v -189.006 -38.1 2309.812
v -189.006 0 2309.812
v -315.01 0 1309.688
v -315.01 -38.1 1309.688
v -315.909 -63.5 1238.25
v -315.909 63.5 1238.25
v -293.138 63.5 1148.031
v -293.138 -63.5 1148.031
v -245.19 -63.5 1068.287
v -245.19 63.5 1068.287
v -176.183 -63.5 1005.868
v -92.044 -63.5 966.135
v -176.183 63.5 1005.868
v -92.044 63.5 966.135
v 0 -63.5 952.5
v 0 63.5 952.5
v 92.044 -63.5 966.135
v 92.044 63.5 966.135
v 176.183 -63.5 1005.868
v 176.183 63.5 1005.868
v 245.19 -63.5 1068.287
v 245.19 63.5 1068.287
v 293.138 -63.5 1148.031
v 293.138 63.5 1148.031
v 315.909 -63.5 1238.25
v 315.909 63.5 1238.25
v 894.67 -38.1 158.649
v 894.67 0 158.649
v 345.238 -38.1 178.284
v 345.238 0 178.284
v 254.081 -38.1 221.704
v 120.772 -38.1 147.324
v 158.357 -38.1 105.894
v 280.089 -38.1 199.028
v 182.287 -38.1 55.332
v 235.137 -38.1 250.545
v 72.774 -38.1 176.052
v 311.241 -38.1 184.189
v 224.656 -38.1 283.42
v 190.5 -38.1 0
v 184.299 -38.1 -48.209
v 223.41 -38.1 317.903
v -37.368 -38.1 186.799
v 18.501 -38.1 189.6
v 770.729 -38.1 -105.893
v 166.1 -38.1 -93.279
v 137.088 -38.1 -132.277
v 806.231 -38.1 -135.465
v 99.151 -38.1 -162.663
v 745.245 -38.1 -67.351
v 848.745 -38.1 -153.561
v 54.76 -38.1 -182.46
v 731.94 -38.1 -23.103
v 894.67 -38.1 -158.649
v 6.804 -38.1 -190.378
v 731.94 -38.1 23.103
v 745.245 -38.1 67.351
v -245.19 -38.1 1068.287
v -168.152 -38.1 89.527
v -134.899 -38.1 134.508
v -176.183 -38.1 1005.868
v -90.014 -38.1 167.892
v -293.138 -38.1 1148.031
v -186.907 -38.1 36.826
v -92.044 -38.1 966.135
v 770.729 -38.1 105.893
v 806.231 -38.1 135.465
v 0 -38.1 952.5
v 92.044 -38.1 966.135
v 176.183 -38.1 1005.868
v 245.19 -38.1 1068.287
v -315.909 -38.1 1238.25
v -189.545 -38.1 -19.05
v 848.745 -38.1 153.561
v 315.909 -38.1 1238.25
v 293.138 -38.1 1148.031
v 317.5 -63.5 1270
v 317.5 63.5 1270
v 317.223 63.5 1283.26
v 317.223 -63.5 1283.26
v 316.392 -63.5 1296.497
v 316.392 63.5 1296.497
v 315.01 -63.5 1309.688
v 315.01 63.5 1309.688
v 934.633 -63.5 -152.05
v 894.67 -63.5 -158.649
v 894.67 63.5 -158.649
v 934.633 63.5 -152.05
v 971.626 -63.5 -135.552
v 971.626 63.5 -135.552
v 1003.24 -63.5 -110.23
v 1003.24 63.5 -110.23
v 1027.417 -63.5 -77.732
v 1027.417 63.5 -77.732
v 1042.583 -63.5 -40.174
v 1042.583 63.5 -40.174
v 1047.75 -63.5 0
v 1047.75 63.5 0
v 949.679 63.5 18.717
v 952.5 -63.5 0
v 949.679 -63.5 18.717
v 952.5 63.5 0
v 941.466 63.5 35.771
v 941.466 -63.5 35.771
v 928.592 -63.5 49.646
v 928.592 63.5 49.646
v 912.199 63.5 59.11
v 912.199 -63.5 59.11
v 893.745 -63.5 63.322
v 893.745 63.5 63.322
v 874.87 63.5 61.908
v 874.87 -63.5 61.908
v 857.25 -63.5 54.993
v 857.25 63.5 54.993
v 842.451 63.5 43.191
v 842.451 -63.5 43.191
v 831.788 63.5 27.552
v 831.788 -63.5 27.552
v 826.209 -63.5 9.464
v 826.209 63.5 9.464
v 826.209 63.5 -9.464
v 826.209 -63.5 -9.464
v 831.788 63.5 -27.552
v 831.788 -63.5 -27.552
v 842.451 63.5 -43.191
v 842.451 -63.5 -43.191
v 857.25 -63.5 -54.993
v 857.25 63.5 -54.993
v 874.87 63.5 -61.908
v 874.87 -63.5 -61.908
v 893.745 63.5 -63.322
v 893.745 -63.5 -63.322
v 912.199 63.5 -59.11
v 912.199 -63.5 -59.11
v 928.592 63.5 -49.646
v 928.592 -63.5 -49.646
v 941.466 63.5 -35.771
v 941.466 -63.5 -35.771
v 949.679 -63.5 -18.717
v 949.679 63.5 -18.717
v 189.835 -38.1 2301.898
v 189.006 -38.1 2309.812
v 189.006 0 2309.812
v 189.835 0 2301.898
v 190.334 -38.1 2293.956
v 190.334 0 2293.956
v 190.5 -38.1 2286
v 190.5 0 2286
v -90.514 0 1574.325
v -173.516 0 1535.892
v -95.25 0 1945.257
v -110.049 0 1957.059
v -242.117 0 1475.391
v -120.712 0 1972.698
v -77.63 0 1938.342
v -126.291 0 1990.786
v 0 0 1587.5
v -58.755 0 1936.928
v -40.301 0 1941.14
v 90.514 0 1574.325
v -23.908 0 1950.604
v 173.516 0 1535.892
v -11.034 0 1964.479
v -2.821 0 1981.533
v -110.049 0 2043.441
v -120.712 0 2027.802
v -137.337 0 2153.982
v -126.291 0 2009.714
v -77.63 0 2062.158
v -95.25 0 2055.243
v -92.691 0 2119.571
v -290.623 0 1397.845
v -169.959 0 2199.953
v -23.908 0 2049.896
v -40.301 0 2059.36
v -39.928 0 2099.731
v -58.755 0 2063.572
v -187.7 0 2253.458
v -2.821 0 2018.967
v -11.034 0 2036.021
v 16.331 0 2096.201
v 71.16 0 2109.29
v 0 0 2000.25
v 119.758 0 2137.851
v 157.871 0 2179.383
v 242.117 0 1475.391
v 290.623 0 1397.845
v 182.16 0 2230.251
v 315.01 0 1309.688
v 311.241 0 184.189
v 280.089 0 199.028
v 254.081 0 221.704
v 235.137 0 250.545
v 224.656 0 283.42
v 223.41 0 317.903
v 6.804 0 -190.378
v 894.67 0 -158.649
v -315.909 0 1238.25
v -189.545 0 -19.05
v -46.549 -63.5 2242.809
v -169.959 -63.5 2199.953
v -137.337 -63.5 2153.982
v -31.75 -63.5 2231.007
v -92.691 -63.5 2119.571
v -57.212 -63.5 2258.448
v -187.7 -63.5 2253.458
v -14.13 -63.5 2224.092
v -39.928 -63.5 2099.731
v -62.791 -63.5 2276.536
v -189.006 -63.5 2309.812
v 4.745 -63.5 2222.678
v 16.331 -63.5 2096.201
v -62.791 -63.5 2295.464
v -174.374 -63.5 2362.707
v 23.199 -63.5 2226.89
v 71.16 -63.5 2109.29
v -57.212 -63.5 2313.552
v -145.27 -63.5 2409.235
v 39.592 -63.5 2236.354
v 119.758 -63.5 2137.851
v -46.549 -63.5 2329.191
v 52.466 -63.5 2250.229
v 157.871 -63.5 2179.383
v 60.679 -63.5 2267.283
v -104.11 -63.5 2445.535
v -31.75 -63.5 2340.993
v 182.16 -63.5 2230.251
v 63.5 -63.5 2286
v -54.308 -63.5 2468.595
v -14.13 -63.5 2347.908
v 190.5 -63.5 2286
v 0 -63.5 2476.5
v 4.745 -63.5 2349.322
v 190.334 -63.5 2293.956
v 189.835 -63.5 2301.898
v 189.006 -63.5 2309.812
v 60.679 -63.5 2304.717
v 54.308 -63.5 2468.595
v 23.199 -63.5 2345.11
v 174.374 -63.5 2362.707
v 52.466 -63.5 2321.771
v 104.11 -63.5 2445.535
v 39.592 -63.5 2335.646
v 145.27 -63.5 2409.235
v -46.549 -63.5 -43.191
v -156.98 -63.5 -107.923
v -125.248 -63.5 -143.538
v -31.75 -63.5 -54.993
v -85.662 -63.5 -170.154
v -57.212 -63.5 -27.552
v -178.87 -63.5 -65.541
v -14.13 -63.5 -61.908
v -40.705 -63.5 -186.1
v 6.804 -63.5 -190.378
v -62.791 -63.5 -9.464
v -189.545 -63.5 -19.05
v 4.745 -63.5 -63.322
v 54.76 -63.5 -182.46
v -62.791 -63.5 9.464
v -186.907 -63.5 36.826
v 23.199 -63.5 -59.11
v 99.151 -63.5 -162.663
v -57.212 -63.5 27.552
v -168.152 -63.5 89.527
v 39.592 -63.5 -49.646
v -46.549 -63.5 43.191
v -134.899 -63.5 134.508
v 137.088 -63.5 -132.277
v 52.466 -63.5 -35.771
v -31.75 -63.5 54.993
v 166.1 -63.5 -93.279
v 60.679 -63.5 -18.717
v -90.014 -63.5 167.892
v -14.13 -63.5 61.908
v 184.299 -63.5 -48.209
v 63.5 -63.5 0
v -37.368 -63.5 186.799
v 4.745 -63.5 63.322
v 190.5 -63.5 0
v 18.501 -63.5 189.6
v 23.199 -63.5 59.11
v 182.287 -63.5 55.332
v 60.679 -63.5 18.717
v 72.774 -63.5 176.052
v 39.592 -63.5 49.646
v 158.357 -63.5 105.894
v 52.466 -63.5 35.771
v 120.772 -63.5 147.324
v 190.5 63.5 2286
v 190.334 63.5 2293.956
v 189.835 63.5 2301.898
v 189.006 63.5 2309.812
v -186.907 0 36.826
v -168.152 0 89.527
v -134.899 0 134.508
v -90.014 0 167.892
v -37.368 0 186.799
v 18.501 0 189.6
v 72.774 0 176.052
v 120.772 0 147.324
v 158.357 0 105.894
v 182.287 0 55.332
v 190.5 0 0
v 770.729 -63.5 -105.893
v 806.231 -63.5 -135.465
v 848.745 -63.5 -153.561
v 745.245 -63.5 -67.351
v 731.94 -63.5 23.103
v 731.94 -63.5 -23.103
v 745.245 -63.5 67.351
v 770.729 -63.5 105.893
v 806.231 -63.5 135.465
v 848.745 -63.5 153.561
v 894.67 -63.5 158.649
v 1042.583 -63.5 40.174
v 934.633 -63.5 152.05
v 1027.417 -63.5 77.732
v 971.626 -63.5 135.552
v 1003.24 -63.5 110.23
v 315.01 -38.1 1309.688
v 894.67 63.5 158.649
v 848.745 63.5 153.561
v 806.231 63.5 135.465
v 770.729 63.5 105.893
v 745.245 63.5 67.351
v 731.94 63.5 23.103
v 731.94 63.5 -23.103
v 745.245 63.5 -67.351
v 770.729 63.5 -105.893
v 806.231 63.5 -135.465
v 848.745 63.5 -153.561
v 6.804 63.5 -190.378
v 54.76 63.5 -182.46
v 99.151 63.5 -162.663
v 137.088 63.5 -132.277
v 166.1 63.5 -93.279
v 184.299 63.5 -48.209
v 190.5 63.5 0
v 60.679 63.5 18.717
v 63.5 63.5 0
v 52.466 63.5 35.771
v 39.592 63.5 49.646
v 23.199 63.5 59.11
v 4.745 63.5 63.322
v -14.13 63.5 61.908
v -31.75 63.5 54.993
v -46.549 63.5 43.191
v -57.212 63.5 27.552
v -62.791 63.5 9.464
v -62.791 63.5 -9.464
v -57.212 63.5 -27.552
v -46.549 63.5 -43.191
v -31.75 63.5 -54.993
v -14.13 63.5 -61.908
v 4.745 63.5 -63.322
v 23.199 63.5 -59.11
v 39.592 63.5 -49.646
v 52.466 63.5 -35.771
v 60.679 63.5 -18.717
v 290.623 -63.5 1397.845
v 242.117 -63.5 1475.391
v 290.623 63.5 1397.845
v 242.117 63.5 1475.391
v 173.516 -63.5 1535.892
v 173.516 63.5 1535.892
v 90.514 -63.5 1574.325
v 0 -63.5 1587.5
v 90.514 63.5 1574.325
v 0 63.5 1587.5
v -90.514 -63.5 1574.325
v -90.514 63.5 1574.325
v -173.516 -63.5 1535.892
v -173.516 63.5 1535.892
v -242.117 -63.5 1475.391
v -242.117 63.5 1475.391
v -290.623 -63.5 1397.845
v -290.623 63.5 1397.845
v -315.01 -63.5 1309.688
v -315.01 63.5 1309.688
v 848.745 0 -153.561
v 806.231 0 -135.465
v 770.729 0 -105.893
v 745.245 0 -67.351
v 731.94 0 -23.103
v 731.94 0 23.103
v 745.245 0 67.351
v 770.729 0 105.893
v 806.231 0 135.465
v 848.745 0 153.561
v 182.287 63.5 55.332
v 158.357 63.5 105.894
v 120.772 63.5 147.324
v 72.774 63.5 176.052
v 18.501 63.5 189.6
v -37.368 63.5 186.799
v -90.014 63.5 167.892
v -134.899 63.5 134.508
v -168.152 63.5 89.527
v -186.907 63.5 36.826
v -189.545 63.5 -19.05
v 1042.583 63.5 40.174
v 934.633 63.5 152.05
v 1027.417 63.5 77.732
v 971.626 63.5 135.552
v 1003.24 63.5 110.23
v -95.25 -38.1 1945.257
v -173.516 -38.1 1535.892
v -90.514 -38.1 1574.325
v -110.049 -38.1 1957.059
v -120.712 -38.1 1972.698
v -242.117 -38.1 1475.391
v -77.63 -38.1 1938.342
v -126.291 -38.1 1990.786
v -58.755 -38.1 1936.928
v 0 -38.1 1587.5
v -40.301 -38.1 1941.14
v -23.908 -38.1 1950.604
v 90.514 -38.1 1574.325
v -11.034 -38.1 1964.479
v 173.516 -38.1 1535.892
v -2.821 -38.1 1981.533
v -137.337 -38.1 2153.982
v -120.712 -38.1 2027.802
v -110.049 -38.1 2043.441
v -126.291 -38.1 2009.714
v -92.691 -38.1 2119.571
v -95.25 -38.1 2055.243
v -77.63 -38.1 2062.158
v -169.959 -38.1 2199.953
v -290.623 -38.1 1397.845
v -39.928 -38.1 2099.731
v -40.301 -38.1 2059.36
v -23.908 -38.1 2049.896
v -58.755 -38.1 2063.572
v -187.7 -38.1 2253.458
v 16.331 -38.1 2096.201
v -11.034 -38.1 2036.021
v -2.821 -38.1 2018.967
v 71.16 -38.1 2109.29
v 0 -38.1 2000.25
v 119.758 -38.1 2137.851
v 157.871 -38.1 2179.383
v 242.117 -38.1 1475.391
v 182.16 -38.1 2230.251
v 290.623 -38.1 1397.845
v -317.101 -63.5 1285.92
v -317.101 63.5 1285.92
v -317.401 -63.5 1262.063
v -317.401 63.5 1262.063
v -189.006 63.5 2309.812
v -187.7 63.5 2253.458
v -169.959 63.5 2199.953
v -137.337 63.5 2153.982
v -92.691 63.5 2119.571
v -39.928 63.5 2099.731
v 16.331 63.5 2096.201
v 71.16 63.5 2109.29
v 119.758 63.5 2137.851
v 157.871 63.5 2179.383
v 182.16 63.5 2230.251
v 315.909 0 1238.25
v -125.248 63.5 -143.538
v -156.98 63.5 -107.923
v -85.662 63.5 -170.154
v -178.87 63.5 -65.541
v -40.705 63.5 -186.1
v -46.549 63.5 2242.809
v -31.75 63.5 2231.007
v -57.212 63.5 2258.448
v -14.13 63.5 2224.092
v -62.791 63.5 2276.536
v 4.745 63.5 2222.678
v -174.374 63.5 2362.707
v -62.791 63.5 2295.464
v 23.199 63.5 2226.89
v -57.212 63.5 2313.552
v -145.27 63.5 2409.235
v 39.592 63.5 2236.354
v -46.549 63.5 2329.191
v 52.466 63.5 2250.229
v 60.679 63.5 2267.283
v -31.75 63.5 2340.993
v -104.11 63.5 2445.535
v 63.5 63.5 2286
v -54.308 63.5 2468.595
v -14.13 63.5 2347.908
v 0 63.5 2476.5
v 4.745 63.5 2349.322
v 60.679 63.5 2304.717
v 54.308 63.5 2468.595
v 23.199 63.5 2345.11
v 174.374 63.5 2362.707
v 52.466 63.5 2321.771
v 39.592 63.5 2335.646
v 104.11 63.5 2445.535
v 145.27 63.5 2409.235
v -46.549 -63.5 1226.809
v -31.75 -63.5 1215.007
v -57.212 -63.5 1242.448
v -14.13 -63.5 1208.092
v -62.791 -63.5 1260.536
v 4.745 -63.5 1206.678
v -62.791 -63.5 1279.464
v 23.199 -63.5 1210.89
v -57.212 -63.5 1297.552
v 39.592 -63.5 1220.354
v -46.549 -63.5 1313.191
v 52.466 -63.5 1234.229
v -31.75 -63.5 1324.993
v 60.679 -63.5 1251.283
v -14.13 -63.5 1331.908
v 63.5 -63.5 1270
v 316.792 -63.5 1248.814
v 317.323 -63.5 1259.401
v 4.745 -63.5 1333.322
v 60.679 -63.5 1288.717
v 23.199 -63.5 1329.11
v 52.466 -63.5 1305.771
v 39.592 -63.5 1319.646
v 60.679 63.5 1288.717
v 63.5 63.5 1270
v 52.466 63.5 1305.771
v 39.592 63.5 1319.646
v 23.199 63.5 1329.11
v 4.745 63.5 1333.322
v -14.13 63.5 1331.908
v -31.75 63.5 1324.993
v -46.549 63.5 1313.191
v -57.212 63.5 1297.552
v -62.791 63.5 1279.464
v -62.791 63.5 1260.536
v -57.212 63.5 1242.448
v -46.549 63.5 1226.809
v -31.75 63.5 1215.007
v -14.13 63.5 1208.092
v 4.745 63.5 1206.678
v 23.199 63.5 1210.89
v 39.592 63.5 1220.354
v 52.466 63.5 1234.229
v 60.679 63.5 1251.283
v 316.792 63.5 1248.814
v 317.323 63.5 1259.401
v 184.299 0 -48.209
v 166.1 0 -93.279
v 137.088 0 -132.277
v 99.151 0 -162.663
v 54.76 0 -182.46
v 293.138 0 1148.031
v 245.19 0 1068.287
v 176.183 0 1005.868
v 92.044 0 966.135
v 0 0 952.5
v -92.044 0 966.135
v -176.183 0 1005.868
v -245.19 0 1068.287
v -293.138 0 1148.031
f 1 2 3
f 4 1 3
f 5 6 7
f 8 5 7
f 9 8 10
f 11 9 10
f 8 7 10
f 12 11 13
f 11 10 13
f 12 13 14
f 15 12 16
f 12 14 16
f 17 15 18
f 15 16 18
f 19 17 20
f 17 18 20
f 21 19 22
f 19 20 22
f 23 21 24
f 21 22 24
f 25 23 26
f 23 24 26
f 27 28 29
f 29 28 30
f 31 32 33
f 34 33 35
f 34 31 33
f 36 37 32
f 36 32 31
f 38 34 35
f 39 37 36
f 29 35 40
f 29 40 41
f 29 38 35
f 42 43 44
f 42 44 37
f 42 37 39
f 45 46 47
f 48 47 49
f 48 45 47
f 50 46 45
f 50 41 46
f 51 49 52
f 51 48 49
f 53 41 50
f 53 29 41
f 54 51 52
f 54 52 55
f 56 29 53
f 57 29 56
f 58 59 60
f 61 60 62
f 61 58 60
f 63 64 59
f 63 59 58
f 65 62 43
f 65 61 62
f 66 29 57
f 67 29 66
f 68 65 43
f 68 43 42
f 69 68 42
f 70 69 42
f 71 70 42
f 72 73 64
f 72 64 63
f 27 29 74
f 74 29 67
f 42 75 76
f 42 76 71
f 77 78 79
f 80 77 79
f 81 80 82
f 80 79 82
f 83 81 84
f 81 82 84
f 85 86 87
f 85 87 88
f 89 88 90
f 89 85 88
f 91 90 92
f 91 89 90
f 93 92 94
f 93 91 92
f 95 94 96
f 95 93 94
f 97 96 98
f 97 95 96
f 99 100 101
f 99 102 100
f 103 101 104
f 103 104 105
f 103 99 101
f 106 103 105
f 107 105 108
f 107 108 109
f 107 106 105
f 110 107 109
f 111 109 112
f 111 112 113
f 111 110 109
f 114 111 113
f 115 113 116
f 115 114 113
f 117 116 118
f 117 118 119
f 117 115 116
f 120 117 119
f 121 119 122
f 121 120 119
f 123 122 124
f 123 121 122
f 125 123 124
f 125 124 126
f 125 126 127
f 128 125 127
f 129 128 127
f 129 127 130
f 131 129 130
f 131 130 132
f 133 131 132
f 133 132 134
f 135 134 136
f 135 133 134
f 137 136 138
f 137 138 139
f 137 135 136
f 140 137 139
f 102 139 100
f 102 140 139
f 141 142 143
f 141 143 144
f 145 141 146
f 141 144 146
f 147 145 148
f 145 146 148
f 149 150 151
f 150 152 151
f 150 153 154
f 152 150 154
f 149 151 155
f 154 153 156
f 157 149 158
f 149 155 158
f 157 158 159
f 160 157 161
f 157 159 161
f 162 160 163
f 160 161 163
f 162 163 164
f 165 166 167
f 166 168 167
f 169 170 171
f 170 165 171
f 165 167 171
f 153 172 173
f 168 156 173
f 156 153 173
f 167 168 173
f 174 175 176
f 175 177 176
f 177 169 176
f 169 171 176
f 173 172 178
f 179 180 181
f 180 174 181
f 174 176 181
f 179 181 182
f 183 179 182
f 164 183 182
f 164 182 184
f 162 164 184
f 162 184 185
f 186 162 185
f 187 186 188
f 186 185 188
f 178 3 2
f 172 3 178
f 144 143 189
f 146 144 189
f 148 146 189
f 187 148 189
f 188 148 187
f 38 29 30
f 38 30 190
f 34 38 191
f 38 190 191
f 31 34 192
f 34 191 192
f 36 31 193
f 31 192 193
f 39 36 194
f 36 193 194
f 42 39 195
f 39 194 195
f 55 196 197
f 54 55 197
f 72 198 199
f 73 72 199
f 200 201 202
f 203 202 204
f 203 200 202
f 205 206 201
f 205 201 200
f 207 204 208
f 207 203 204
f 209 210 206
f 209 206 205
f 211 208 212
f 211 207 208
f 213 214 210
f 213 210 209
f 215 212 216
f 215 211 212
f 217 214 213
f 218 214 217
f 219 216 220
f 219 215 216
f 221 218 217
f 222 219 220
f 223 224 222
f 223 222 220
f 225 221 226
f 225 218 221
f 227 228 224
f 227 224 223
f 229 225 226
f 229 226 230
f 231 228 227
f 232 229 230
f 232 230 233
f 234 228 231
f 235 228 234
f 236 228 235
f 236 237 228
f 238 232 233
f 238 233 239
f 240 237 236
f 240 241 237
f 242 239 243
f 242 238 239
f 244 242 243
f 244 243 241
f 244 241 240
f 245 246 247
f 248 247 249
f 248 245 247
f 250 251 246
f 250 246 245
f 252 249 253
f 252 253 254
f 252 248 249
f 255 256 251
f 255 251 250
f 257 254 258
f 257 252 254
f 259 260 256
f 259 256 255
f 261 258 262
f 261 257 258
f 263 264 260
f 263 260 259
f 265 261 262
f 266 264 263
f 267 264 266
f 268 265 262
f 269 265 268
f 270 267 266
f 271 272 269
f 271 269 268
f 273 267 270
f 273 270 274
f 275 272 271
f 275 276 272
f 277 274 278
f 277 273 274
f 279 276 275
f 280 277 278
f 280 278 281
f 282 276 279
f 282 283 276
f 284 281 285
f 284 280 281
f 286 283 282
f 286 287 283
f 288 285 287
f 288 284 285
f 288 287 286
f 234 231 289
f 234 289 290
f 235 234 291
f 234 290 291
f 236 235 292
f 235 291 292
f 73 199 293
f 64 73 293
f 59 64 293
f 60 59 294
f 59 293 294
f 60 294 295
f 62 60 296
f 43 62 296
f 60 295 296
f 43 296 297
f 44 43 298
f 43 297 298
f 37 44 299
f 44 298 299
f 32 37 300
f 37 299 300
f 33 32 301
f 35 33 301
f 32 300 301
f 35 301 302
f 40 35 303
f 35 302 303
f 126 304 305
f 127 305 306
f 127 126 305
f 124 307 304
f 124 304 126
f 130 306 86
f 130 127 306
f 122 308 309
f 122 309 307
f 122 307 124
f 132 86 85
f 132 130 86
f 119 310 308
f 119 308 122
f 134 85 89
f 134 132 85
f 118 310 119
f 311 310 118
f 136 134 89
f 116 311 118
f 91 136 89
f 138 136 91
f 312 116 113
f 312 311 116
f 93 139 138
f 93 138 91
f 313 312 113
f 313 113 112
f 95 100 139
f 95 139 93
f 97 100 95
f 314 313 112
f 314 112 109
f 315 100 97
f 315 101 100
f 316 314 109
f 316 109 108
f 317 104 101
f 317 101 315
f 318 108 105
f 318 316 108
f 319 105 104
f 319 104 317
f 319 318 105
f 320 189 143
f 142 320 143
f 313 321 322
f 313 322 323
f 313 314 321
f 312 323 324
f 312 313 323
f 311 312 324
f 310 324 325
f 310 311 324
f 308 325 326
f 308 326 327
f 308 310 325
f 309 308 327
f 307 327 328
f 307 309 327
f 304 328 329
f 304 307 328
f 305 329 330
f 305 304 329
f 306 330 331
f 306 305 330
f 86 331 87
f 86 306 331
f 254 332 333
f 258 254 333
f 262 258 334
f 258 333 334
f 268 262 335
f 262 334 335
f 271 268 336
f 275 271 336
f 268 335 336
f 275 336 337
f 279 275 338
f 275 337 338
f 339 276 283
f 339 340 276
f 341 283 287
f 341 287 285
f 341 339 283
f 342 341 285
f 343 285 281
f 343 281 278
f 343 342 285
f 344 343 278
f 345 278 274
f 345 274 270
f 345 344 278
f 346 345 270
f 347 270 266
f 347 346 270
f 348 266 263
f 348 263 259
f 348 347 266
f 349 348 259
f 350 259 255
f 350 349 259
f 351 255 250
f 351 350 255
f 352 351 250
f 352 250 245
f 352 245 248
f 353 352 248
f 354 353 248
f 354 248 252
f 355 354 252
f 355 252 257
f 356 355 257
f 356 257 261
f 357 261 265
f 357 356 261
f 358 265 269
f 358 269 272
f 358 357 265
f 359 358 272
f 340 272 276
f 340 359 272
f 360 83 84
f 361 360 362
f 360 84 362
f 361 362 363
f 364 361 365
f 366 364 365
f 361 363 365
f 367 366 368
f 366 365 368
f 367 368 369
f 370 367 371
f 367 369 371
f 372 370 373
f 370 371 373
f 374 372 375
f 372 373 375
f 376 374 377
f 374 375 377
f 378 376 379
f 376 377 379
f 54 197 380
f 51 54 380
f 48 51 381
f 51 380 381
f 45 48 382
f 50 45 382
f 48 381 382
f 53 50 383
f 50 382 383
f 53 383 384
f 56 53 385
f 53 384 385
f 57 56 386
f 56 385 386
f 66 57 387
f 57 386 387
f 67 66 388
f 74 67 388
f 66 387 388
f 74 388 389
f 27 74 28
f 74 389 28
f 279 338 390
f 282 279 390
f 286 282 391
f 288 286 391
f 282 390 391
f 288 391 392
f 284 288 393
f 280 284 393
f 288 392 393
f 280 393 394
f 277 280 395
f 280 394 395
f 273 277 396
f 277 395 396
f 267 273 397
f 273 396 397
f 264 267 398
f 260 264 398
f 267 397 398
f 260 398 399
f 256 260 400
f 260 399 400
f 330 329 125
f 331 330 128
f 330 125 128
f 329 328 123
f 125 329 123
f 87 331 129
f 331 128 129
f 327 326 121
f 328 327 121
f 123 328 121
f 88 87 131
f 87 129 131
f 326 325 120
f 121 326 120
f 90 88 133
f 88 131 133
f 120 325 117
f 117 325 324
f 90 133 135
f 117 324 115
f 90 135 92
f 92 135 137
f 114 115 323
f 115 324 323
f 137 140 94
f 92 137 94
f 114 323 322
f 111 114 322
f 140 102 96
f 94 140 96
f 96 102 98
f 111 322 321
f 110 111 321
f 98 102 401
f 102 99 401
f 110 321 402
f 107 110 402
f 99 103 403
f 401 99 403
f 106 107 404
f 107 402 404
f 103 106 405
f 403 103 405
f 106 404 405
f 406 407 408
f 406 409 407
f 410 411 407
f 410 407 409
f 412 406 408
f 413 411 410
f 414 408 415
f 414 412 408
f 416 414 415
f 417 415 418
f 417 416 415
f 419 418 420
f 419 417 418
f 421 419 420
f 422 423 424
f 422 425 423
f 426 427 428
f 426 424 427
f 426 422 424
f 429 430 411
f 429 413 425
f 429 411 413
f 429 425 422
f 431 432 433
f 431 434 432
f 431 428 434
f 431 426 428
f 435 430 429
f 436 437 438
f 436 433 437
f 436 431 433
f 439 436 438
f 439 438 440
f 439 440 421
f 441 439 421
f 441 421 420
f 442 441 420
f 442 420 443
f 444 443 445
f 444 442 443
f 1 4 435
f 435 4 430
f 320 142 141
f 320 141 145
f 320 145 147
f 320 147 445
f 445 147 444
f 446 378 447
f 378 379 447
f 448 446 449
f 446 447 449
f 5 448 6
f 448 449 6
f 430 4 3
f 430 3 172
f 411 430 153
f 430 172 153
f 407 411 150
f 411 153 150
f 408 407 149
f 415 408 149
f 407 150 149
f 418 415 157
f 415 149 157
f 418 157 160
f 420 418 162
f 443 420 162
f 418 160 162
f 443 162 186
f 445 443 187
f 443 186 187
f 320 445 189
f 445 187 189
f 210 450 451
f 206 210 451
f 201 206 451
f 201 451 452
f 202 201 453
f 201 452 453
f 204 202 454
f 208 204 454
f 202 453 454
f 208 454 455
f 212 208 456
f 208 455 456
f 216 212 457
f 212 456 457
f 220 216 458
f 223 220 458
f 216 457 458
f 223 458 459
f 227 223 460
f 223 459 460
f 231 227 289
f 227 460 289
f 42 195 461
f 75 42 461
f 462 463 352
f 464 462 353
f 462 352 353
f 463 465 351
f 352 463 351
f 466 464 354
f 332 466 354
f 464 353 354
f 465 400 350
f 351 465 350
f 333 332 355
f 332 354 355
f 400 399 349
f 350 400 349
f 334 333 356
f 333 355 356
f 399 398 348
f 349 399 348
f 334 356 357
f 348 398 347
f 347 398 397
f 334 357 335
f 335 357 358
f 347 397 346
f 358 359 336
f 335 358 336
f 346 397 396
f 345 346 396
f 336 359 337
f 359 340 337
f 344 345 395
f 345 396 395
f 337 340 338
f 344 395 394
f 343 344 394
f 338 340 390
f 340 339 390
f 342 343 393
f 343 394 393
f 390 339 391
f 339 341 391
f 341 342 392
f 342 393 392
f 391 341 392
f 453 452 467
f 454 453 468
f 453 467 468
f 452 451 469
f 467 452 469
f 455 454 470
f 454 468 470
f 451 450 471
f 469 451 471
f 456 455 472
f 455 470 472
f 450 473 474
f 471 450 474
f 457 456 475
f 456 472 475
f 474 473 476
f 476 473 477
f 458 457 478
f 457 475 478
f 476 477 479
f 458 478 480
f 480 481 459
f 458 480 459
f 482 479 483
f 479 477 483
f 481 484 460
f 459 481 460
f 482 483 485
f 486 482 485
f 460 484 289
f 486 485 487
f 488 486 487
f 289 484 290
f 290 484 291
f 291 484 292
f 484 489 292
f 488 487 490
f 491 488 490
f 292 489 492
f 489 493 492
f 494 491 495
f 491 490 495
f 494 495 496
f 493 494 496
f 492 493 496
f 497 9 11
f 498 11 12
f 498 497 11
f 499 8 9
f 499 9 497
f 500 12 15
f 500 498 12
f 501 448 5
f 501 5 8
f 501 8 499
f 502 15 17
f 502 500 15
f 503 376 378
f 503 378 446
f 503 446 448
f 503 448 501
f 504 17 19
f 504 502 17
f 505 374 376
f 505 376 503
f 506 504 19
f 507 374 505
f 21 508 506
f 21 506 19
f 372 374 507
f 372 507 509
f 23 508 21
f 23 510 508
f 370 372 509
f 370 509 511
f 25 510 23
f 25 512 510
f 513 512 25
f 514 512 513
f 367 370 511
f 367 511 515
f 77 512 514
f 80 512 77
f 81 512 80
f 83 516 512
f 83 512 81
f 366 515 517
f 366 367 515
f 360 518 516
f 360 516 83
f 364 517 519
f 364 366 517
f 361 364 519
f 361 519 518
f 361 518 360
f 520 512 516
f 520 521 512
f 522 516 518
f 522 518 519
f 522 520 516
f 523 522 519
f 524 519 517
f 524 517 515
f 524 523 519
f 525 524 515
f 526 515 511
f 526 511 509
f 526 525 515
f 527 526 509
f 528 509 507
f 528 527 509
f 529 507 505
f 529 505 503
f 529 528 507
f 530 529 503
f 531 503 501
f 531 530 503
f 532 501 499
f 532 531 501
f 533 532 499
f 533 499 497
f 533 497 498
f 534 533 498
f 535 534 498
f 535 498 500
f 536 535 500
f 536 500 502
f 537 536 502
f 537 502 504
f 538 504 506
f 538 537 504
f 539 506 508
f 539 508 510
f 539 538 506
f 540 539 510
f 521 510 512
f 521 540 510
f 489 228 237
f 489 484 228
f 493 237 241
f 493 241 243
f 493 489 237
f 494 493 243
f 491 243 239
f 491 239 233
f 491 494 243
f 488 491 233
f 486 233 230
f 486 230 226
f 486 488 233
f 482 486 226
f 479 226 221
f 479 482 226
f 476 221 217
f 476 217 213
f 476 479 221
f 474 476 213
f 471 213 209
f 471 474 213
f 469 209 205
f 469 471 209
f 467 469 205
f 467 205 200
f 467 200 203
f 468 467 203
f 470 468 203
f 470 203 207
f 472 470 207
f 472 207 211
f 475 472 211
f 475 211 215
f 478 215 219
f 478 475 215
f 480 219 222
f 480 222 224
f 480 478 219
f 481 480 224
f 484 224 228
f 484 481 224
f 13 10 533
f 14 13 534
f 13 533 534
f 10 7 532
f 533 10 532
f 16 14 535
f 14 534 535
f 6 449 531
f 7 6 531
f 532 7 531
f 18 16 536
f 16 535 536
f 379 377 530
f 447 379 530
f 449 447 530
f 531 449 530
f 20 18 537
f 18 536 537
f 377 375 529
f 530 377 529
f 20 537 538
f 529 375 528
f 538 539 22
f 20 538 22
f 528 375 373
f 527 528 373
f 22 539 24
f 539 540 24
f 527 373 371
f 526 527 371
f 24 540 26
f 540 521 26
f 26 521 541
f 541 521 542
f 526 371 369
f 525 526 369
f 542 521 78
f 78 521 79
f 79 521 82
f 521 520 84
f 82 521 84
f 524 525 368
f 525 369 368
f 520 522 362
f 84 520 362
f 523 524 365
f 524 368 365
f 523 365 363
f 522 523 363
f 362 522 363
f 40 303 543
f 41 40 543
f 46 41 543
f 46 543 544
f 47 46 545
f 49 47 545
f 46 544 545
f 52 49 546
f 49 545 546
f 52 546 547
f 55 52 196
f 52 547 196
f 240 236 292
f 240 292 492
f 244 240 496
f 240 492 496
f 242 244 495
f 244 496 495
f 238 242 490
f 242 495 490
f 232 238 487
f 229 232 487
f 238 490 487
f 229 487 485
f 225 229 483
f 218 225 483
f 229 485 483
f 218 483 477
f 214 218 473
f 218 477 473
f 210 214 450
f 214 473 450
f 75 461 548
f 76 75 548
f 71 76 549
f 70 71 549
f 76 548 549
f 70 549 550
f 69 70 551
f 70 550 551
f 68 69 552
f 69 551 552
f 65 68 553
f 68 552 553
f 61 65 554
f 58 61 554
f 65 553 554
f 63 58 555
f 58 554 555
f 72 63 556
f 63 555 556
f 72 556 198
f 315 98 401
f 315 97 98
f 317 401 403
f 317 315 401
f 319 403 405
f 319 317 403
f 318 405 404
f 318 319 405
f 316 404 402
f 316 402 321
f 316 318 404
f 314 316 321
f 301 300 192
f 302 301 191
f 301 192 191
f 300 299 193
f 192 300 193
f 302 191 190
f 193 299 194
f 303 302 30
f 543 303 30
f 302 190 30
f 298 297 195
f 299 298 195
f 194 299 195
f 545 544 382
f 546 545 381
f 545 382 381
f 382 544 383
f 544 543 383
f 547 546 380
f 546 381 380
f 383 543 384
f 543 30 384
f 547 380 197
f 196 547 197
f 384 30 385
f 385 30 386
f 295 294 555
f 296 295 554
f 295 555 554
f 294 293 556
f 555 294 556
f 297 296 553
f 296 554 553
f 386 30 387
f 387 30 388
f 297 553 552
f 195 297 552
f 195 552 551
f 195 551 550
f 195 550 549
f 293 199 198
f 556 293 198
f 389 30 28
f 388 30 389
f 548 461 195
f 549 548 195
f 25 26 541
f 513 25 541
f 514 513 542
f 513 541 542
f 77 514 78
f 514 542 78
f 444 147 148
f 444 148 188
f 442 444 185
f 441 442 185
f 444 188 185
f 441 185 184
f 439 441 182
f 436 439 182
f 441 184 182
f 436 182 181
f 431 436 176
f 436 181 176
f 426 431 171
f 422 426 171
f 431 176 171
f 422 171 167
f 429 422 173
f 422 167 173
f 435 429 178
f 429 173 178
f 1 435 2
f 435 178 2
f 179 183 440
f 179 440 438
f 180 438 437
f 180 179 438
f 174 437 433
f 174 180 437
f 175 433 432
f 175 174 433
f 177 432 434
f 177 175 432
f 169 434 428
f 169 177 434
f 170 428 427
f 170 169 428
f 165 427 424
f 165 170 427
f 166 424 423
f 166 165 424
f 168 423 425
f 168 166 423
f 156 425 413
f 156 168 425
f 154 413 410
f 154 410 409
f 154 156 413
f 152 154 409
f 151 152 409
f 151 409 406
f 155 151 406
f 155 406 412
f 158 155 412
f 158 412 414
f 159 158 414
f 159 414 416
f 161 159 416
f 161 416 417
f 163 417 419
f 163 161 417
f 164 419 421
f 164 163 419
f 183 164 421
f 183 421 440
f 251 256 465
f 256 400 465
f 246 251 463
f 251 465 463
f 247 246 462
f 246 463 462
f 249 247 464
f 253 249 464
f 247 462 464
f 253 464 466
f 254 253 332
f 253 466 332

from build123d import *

# Parameters (mm, degrees)
F0_R     = 63.5
F1_DEPTH = 63.5
F2_DEPTH = 38.1


with BuildPart() as f1:
    # F0 (on Front) → F1 (new body, symmetric)
    with BuildSketch(Plane.XZ):
        with BuildLine():
            ThreePointArc((-189.005859, 2309.8125), (-11.929665, 2095.873902), (190.5, 2286))
            ThreePointArc((190.5, 2286), (190.126098, 2297.929665), (189.005859, 2309.8125))
            ThreePointArc((189.005859, 2309.8125), (0, 2476.5), (-189.005859, 2309.8125))
        make_face()
        with Locations((0, 2286)):
            Circle(F0_R, mode=Mode.SUBTRACT)
        with BuildLine():
            ThreePointArc((317.5, 1270), (316.87683, 1289.882775), (315.009765, 1309.6875))
            ThreePointArc((315.009765, 1309.6875), (0, 1587.5), (-315.009765, 1309.6875))
            ThreePointArc((-315.009765, 1309.6875), (-317.474876, 1273.99411), (-315.908511, 1238.25))
            ThreePointArc((-315.908511, 1238.25), (0, 952.5), (315.908511, 1238.25))
            ThreePointArc((315.908511, 1238.25), (317.101878, 1254.105069), (317.5, 1270))
        make_face()
        with Locations((0, 1270)):
            Circle(F0_R, mode=Mode.SUBTRACT)
        with BuildLine():
            ThreePointArc((190.5, 0), (-9.536959, 190.261127), (-189.545107, -19.05))
            ThreePointArc((-189.545107, -19.05), (-125.247668, -143.538398), (6.803571, -190.378469))
            ThreePointArc((6.803571, -190.378469), (137.088166, -132.276547), (190.5, 0))
        make_face()
        Circle(F0_R, mode=Mode.SUBTRACT)
        with BuildLine():
            ThreePointArc((894.669643, 158.648724), (730.25, 0), (894.669643, -158.648724))
            ThreePointArc((894.669643, -158.648724), (1003.240138, -110.230456), (1047.75, 0))
            ThreePointArc((1047.75, 0), (1003.240138, 110.230456), (894.669643, 158.648724))
        make_face()
        with Locations((889, 0)):
            Circle(F0_R, mode=Mode.SUBTRACT)
    extrude(amount=F1_DEPTH, both=True)


with BuildPart() as f2:
    # F0 (on Front) → F2 (new body)
    with BuildSketch(Plane.XZ):
        with BuildLine():
            ThreePointArc((189.005859, 2309.8125), (190.126098, 2297.929665), (190.5, 2286))
            ThreePointArc((190.5, 2286), (-11.929665, 2095.873902), (-189.005859, 2309.8125))
            Line((-189.005859, 2309.8125), (-315.009765, 1309.6875))
            ThreePointArc((-315.009765, 1309.6875), (0, 1587.5), (315.009765, 1309.6875))
            Line((315.009765, 1309.6875), (189.005859, 2309.8125))
        make_face()
        with Locations((-63.5, 2000.25)):
            Circle(F0_R, mode=Mode.SUBTRACT)
        with BuildLine():
            ThreePointArc((315.908511, 1238.25), (0, 952.5), (-315.908511, 1238.25))
            Line((-315.908511, 1238.25), (-189.545107, -19.05))
            ThreePointArc((-189.545107, -19.05), (-9.536959, 190.261127), (190.5, 0))
            ThreePointArc((190.5, 0), (137.088166, -132.276547), (6.803571, -190.378469))
            Line((6.803571, -190.378469), (894.669643, -158.648724))
            ThreePointArc((894.669643, -158.648724), (730.25, 0), (894.669643, 158.648724))
            Line((894.669643, 158.648724), (345.237827, 178.283815))
            ThreePointArc((345.237827, 178.283815), (254.081276, 221.704349), (223.410137, 317.902795))
            Line((223.410137, 317.902795), (315.908511, 1238.25))
        make_face()
    extrude(amount=F2_DEPTH)


solid = Compound([f1.part, f2.part])
